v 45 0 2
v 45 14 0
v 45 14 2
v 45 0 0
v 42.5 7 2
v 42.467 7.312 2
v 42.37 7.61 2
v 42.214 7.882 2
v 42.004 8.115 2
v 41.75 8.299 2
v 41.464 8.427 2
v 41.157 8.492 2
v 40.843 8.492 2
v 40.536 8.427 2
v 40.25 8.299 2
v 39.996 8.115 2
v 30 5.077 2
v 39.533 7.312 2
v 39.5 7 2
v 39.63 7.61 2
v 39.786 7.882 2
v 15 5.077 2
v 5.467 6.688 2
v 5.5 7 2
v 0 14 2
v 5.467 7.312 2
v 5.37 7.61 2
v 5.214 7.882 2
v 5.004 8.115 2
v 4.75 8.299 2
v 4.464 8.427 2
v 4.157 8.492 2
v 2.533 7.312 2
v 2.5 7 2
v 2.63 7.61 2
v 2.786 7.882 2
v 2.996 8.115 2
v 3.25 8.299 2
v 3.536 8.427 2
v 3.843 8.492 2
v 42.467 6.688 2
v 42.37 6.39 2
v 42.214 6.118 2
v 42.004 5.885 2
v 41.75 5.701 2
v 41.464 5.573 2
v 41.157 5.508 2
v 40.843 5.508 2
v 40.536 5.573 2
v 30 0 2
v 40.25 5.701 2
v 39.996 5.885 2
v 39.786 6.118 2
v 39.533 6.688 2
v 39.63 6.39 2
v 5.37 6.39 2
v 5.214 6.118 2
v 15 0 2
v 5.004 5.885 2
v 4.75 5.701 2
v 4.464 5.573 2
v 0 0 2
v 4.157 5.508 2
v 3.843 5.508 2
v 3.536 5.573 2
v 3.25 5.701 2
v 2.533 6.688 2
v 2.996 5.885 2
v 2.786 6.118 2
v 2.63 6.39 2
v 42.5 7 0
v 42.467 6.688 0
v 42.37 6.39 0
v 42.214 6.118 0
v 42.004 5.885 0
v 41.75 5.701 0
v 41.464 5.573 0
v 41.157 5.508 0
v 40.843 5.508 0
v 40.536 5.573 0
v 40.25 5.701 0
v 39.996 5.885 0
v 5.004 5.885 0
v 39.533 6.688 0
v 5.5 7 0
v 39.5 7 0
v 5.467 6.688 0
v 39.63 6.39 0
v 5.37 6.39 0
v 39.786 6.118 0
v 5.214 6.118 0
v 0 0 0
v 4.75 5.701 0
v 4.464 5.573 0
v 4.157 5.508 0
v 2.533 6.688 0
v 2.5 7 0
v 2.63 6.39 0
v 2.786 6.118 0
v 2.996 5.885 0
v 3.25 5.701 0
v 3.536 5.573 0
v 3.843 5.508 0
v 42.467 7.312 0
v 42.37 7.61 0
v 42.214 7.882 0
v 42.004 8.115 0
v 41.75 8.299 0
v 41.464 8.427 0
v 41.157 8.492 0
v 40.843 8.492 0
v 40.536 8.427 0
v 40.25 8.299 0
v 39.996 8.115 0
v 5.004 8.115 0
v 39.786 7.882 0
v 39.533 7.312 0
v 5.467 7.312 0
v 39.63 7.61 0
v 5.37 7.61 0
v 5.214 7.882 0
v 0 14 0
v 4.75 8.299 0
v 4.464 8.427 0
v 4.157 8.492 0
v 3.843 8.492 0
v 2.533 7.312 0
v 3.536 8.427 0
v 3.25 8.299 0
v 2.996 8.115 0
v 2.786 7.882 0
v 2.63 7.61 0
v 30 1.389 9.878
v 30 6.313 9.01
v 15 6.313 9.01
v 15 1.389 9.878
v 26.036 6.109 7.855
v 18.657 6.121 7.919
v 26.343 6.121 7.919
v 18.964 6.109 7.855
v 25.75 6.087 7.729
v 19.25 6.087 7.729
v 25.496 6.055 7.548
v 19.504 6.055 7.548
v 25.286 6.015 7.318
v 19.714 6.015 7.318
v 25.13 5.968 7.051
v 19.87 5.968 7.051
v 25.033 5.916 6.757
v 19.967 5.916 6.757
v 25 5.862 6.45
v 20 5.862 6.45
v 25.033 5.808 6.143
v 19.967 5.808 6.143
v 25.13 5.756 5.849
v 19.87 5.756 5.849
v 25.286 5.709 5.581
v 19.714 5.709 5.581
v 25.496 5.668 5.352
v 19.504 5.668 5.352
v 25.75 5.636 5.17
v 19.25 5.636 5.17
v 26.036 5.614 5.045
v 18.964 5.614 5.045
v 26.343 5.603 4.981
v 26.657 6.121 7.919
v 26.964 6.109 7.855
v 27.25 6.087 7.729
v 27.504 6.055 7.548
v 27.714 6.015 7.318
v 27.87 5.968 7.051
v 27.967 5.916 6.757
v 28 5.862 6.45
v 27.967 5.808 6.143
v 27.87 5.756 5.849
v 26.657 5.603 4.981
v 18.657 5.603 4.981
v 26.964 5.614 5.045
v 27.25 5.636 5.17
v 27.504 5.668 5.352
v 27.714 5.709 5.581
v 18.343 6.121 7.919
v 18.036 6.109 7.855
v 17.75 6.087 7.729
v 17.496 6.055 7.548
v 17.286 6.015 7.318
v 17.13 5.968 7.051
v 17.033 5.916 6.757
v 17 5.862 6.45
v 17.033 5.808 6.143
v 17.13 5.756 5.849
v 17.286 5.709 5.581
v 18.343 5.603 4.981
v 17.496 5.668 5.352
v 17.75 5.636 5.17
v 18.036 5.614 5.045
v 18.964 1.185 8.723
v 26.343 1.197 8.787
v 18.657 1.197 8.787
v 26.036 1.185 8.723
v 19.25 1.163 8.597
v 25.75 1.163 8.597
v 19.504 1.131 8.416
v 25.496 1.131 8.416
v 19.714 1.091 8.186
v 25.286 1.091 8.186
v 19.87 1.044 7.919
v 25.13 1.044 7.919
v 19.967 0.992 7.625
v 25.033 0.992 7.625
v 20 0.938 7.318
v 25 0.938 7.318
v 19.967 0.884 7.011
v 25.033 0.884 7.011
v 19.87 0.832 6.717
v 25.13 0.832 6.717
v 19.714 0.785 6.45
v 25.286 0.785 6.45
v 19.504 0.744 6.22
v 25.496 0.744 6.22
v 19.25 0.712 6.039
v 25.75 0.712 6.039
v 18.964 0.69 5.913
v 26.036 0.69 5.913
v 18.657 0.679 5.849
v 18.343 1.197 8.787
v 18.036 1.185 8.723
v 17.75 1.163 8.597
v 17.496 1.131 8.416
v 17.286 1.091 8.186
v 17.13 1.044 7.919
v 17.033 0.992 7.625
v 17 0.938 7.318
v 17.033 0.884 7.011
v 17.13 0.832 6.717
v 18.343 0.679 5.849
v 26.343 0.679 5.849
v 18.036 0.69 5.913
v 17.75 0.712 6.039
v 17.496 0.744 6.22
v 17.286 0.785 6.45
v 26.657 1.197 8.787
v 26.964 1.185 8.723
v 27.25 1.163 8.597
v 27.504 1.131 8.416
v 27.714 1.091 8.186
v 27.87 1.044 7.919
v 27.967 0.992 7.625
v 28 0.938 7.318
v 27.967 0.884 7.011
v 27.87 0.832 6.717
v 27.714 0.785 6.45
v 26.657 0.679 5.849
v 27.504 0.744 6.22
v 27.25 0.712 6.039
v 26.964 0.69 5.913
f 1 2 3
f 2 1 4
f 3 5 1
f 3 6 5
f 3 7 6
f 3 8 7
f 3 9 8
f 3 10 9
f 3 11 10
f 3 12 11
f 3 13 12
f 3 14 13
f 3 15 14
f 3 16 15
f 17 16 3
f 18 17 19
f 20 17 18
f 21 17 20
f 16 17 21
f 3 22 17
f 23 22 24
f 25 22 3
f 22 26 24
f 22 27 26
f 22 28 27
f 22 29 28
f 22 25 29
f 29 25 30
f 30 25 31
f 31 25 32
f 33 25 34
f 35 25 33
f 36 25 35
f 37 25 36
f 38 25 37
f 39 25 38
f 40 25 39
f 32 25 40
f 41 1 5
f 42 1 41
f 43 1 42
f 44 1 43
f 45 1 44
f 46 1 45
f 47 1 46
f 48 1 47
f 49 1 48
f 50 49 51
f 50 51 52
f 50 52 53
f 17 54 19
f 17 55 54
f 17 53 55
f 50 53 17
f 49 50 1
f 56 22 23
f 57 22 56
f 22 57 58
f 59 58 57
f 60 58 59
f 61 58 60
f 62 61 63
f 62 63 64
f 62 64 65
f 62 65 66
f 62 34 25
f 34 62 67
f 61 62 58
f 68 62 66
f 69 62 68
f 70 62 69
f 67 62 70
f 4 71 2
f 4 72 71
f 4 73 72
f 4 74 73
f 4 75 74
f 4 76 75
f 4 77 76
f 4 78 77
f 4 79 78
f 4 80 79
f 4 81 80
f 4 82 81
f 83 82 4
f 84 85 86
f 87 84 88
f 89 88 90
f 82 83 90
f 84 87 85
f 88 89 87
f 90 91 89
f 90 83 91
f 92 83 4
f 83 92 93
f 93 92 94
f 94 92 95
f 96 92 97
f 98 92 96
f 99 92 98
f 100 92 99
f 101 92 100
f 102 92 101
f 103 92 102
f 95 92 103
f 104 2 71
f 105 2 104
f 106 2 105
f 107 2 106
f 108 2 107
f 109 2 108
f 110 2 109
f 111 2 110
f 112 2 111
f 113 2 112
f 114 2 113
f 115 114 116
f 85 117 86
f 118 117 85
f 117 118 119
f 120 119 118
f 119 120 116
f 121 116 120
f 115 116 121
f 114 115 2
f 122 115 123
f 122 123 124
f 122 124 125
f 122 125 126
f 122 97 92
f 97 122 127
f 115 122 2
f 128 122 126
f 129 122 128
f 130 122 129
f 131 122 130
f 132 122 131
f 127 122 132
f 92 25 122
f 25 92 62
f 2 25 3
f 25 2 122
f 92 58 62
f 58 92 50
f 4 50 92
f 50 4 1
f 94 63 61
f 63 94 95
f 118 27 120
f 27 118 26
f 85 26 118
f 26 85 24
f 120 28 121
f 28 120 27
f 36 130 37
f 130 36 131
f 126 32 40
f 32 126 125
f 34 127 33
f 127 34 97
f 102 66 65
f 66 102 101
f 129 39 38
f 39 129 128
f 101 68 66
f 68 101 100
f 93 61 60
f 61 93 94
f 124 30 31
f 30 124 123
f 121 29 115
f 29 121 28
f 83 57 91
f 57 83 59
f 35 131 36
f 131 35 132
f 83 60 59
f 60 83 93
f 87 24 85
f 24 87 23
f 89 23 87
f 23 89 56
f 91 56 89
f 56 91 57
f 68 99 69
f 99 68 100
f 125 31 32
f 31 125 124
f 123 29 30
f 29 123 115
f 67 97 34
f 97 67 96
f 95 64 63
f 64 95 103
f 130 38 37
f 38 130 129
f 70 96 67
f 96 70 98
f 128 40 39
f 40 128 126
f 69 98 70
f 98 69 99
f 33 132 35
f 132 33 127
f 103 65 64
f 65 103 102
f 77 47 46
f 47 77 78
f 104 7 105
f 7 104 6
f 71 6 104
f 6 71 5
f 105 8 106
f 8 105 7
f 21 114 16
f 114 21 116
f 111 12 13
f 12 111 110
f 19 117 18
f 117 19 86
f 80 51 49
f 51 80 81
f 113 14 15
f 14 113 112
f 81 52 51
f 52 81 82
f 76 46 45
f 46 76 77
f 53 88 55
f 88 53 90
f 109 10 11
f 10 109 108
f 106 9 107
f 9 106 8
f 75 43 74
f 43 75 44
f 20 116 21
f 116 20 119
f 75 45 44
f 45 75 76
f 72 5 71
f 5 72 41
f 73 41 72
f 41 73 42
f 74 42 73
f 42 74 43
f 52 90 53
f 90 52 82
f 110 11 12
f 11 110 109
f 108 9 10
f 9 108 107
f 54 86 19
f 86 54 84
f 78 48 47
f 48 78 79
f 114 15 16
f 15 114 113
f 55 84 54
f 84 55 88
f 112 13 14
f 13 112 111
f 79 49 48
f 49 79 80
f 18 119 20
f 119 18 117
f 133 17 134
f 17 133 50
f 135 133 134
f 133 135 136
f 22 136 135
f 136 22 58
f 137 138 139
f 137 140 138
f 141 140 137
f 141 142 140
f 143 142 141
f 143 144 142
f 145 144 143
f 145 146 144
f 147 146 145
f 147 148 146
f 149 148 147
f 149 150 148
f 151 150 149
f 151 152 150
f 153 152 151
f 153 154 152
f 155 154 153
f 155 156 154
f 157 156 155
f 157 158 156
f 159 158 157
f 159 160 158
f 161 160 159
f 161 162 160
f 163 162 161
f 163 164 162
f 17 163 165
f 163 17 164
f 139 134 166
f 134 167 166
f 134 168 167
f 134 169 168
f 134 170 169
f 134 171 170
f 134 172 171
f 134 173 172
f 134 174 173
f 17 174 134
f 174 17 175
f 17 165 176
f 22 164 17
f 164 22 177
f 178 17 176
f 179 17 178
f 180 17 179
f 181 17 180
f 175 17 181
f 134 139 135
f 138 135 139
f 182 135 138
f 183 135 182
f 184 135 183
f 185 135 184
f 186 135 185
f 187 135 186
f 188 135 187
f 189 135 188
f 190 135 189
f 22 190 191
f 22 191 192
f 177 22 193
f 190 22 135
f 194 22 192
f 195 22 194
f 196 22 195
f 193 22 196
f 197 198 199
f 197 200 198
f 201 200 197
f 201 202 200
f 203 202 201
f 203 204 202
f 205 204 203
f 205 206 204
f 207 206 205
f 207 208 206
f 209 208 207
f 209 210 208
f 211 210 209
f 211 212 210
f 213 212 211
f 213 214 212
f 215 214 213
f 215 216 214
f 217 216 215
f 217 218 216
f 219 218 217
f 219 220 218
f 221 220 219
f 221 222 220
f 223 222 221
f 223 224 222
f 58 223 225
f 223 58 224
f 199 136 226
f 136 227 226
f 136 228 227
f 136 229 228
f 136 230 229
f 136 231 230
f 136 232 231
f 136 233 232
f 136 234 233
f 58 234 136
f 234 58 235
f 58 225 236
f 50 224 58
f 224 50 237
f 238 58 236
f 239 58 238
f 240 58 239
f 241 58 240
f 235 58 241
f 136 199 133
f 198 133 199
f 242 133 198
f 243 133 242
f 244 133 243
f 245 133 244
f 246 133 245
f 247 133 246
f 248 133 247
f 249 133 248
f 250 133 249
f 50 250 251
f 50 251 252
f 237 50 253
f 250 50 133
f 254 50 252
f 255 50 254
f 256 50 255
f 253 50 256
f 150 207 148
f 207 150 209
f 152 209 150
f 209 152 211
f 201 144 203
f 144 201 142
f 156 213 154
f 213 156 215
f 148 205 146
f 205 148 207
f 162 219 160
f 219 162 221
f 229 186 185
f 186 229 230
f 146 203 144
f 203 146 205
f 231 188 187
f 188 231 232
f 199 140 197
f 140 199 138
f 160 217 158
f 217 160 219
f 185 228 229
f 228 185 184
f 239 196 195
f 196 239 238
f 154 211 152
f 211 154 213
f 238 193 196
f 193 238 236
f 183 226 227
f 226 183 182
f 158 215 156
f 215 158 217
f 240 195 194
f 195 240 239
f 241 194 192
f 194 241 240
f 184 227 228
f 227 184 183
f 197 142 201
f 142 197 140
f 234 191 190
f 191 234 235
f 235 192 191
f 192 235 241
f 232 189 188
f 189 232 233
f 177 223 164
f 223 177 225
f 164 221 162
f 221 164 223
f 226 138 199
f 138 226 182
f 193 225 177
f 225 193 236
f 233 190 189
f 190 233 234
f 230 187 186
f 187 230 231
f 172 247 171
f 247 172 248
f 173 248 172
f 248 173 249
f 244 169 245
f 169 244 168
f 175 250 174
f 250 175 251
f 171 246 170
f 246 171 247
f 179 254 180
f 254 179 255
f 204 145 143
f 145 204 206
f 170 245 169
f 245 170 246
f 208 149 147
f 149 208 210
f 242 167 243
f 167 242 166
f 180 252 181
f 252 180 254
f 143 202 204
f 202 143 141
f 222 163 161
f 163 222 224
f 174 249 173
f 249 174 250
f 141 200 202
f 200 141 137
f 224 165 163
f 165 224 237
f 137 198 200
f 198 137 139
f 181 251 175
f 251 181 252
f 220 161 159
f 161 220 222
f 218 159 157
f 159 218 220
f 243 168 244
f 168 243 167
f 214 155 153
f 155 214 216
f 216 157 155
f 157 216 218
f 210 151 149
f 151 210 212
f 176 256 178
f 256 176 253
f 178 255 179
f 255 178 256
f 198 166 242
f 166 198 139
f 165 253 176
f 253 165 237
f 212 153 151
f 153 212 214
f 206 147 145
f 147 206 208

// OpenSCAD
angle = 10;

difference(){



union(){

difference(){ 
cube([45,14,2]);
translate([4,7,0-1])
    cylinder(r=1.5,h=10,$fs = 0.1);
translate([4+37,7,0-1])
    cylinder(r=1.5,h=10,$fs = 0.1); 
}



translate([15,0,2])
rotate([-angle,0,0])

difference(){ 
cube([15,5,8]);
translate([3.5,7,5.4])
rotate([90,0,0])
    cylinder(r=1.5,h=10,$fs = 0.1);
translate([3.5+8,7,5.4])
rotate([90,0,0])
    cylinder(r=1.5,h=10,$fs = 0.1); 
}


}



translate([0,0,-10])
cube([45,20,10]);
}
